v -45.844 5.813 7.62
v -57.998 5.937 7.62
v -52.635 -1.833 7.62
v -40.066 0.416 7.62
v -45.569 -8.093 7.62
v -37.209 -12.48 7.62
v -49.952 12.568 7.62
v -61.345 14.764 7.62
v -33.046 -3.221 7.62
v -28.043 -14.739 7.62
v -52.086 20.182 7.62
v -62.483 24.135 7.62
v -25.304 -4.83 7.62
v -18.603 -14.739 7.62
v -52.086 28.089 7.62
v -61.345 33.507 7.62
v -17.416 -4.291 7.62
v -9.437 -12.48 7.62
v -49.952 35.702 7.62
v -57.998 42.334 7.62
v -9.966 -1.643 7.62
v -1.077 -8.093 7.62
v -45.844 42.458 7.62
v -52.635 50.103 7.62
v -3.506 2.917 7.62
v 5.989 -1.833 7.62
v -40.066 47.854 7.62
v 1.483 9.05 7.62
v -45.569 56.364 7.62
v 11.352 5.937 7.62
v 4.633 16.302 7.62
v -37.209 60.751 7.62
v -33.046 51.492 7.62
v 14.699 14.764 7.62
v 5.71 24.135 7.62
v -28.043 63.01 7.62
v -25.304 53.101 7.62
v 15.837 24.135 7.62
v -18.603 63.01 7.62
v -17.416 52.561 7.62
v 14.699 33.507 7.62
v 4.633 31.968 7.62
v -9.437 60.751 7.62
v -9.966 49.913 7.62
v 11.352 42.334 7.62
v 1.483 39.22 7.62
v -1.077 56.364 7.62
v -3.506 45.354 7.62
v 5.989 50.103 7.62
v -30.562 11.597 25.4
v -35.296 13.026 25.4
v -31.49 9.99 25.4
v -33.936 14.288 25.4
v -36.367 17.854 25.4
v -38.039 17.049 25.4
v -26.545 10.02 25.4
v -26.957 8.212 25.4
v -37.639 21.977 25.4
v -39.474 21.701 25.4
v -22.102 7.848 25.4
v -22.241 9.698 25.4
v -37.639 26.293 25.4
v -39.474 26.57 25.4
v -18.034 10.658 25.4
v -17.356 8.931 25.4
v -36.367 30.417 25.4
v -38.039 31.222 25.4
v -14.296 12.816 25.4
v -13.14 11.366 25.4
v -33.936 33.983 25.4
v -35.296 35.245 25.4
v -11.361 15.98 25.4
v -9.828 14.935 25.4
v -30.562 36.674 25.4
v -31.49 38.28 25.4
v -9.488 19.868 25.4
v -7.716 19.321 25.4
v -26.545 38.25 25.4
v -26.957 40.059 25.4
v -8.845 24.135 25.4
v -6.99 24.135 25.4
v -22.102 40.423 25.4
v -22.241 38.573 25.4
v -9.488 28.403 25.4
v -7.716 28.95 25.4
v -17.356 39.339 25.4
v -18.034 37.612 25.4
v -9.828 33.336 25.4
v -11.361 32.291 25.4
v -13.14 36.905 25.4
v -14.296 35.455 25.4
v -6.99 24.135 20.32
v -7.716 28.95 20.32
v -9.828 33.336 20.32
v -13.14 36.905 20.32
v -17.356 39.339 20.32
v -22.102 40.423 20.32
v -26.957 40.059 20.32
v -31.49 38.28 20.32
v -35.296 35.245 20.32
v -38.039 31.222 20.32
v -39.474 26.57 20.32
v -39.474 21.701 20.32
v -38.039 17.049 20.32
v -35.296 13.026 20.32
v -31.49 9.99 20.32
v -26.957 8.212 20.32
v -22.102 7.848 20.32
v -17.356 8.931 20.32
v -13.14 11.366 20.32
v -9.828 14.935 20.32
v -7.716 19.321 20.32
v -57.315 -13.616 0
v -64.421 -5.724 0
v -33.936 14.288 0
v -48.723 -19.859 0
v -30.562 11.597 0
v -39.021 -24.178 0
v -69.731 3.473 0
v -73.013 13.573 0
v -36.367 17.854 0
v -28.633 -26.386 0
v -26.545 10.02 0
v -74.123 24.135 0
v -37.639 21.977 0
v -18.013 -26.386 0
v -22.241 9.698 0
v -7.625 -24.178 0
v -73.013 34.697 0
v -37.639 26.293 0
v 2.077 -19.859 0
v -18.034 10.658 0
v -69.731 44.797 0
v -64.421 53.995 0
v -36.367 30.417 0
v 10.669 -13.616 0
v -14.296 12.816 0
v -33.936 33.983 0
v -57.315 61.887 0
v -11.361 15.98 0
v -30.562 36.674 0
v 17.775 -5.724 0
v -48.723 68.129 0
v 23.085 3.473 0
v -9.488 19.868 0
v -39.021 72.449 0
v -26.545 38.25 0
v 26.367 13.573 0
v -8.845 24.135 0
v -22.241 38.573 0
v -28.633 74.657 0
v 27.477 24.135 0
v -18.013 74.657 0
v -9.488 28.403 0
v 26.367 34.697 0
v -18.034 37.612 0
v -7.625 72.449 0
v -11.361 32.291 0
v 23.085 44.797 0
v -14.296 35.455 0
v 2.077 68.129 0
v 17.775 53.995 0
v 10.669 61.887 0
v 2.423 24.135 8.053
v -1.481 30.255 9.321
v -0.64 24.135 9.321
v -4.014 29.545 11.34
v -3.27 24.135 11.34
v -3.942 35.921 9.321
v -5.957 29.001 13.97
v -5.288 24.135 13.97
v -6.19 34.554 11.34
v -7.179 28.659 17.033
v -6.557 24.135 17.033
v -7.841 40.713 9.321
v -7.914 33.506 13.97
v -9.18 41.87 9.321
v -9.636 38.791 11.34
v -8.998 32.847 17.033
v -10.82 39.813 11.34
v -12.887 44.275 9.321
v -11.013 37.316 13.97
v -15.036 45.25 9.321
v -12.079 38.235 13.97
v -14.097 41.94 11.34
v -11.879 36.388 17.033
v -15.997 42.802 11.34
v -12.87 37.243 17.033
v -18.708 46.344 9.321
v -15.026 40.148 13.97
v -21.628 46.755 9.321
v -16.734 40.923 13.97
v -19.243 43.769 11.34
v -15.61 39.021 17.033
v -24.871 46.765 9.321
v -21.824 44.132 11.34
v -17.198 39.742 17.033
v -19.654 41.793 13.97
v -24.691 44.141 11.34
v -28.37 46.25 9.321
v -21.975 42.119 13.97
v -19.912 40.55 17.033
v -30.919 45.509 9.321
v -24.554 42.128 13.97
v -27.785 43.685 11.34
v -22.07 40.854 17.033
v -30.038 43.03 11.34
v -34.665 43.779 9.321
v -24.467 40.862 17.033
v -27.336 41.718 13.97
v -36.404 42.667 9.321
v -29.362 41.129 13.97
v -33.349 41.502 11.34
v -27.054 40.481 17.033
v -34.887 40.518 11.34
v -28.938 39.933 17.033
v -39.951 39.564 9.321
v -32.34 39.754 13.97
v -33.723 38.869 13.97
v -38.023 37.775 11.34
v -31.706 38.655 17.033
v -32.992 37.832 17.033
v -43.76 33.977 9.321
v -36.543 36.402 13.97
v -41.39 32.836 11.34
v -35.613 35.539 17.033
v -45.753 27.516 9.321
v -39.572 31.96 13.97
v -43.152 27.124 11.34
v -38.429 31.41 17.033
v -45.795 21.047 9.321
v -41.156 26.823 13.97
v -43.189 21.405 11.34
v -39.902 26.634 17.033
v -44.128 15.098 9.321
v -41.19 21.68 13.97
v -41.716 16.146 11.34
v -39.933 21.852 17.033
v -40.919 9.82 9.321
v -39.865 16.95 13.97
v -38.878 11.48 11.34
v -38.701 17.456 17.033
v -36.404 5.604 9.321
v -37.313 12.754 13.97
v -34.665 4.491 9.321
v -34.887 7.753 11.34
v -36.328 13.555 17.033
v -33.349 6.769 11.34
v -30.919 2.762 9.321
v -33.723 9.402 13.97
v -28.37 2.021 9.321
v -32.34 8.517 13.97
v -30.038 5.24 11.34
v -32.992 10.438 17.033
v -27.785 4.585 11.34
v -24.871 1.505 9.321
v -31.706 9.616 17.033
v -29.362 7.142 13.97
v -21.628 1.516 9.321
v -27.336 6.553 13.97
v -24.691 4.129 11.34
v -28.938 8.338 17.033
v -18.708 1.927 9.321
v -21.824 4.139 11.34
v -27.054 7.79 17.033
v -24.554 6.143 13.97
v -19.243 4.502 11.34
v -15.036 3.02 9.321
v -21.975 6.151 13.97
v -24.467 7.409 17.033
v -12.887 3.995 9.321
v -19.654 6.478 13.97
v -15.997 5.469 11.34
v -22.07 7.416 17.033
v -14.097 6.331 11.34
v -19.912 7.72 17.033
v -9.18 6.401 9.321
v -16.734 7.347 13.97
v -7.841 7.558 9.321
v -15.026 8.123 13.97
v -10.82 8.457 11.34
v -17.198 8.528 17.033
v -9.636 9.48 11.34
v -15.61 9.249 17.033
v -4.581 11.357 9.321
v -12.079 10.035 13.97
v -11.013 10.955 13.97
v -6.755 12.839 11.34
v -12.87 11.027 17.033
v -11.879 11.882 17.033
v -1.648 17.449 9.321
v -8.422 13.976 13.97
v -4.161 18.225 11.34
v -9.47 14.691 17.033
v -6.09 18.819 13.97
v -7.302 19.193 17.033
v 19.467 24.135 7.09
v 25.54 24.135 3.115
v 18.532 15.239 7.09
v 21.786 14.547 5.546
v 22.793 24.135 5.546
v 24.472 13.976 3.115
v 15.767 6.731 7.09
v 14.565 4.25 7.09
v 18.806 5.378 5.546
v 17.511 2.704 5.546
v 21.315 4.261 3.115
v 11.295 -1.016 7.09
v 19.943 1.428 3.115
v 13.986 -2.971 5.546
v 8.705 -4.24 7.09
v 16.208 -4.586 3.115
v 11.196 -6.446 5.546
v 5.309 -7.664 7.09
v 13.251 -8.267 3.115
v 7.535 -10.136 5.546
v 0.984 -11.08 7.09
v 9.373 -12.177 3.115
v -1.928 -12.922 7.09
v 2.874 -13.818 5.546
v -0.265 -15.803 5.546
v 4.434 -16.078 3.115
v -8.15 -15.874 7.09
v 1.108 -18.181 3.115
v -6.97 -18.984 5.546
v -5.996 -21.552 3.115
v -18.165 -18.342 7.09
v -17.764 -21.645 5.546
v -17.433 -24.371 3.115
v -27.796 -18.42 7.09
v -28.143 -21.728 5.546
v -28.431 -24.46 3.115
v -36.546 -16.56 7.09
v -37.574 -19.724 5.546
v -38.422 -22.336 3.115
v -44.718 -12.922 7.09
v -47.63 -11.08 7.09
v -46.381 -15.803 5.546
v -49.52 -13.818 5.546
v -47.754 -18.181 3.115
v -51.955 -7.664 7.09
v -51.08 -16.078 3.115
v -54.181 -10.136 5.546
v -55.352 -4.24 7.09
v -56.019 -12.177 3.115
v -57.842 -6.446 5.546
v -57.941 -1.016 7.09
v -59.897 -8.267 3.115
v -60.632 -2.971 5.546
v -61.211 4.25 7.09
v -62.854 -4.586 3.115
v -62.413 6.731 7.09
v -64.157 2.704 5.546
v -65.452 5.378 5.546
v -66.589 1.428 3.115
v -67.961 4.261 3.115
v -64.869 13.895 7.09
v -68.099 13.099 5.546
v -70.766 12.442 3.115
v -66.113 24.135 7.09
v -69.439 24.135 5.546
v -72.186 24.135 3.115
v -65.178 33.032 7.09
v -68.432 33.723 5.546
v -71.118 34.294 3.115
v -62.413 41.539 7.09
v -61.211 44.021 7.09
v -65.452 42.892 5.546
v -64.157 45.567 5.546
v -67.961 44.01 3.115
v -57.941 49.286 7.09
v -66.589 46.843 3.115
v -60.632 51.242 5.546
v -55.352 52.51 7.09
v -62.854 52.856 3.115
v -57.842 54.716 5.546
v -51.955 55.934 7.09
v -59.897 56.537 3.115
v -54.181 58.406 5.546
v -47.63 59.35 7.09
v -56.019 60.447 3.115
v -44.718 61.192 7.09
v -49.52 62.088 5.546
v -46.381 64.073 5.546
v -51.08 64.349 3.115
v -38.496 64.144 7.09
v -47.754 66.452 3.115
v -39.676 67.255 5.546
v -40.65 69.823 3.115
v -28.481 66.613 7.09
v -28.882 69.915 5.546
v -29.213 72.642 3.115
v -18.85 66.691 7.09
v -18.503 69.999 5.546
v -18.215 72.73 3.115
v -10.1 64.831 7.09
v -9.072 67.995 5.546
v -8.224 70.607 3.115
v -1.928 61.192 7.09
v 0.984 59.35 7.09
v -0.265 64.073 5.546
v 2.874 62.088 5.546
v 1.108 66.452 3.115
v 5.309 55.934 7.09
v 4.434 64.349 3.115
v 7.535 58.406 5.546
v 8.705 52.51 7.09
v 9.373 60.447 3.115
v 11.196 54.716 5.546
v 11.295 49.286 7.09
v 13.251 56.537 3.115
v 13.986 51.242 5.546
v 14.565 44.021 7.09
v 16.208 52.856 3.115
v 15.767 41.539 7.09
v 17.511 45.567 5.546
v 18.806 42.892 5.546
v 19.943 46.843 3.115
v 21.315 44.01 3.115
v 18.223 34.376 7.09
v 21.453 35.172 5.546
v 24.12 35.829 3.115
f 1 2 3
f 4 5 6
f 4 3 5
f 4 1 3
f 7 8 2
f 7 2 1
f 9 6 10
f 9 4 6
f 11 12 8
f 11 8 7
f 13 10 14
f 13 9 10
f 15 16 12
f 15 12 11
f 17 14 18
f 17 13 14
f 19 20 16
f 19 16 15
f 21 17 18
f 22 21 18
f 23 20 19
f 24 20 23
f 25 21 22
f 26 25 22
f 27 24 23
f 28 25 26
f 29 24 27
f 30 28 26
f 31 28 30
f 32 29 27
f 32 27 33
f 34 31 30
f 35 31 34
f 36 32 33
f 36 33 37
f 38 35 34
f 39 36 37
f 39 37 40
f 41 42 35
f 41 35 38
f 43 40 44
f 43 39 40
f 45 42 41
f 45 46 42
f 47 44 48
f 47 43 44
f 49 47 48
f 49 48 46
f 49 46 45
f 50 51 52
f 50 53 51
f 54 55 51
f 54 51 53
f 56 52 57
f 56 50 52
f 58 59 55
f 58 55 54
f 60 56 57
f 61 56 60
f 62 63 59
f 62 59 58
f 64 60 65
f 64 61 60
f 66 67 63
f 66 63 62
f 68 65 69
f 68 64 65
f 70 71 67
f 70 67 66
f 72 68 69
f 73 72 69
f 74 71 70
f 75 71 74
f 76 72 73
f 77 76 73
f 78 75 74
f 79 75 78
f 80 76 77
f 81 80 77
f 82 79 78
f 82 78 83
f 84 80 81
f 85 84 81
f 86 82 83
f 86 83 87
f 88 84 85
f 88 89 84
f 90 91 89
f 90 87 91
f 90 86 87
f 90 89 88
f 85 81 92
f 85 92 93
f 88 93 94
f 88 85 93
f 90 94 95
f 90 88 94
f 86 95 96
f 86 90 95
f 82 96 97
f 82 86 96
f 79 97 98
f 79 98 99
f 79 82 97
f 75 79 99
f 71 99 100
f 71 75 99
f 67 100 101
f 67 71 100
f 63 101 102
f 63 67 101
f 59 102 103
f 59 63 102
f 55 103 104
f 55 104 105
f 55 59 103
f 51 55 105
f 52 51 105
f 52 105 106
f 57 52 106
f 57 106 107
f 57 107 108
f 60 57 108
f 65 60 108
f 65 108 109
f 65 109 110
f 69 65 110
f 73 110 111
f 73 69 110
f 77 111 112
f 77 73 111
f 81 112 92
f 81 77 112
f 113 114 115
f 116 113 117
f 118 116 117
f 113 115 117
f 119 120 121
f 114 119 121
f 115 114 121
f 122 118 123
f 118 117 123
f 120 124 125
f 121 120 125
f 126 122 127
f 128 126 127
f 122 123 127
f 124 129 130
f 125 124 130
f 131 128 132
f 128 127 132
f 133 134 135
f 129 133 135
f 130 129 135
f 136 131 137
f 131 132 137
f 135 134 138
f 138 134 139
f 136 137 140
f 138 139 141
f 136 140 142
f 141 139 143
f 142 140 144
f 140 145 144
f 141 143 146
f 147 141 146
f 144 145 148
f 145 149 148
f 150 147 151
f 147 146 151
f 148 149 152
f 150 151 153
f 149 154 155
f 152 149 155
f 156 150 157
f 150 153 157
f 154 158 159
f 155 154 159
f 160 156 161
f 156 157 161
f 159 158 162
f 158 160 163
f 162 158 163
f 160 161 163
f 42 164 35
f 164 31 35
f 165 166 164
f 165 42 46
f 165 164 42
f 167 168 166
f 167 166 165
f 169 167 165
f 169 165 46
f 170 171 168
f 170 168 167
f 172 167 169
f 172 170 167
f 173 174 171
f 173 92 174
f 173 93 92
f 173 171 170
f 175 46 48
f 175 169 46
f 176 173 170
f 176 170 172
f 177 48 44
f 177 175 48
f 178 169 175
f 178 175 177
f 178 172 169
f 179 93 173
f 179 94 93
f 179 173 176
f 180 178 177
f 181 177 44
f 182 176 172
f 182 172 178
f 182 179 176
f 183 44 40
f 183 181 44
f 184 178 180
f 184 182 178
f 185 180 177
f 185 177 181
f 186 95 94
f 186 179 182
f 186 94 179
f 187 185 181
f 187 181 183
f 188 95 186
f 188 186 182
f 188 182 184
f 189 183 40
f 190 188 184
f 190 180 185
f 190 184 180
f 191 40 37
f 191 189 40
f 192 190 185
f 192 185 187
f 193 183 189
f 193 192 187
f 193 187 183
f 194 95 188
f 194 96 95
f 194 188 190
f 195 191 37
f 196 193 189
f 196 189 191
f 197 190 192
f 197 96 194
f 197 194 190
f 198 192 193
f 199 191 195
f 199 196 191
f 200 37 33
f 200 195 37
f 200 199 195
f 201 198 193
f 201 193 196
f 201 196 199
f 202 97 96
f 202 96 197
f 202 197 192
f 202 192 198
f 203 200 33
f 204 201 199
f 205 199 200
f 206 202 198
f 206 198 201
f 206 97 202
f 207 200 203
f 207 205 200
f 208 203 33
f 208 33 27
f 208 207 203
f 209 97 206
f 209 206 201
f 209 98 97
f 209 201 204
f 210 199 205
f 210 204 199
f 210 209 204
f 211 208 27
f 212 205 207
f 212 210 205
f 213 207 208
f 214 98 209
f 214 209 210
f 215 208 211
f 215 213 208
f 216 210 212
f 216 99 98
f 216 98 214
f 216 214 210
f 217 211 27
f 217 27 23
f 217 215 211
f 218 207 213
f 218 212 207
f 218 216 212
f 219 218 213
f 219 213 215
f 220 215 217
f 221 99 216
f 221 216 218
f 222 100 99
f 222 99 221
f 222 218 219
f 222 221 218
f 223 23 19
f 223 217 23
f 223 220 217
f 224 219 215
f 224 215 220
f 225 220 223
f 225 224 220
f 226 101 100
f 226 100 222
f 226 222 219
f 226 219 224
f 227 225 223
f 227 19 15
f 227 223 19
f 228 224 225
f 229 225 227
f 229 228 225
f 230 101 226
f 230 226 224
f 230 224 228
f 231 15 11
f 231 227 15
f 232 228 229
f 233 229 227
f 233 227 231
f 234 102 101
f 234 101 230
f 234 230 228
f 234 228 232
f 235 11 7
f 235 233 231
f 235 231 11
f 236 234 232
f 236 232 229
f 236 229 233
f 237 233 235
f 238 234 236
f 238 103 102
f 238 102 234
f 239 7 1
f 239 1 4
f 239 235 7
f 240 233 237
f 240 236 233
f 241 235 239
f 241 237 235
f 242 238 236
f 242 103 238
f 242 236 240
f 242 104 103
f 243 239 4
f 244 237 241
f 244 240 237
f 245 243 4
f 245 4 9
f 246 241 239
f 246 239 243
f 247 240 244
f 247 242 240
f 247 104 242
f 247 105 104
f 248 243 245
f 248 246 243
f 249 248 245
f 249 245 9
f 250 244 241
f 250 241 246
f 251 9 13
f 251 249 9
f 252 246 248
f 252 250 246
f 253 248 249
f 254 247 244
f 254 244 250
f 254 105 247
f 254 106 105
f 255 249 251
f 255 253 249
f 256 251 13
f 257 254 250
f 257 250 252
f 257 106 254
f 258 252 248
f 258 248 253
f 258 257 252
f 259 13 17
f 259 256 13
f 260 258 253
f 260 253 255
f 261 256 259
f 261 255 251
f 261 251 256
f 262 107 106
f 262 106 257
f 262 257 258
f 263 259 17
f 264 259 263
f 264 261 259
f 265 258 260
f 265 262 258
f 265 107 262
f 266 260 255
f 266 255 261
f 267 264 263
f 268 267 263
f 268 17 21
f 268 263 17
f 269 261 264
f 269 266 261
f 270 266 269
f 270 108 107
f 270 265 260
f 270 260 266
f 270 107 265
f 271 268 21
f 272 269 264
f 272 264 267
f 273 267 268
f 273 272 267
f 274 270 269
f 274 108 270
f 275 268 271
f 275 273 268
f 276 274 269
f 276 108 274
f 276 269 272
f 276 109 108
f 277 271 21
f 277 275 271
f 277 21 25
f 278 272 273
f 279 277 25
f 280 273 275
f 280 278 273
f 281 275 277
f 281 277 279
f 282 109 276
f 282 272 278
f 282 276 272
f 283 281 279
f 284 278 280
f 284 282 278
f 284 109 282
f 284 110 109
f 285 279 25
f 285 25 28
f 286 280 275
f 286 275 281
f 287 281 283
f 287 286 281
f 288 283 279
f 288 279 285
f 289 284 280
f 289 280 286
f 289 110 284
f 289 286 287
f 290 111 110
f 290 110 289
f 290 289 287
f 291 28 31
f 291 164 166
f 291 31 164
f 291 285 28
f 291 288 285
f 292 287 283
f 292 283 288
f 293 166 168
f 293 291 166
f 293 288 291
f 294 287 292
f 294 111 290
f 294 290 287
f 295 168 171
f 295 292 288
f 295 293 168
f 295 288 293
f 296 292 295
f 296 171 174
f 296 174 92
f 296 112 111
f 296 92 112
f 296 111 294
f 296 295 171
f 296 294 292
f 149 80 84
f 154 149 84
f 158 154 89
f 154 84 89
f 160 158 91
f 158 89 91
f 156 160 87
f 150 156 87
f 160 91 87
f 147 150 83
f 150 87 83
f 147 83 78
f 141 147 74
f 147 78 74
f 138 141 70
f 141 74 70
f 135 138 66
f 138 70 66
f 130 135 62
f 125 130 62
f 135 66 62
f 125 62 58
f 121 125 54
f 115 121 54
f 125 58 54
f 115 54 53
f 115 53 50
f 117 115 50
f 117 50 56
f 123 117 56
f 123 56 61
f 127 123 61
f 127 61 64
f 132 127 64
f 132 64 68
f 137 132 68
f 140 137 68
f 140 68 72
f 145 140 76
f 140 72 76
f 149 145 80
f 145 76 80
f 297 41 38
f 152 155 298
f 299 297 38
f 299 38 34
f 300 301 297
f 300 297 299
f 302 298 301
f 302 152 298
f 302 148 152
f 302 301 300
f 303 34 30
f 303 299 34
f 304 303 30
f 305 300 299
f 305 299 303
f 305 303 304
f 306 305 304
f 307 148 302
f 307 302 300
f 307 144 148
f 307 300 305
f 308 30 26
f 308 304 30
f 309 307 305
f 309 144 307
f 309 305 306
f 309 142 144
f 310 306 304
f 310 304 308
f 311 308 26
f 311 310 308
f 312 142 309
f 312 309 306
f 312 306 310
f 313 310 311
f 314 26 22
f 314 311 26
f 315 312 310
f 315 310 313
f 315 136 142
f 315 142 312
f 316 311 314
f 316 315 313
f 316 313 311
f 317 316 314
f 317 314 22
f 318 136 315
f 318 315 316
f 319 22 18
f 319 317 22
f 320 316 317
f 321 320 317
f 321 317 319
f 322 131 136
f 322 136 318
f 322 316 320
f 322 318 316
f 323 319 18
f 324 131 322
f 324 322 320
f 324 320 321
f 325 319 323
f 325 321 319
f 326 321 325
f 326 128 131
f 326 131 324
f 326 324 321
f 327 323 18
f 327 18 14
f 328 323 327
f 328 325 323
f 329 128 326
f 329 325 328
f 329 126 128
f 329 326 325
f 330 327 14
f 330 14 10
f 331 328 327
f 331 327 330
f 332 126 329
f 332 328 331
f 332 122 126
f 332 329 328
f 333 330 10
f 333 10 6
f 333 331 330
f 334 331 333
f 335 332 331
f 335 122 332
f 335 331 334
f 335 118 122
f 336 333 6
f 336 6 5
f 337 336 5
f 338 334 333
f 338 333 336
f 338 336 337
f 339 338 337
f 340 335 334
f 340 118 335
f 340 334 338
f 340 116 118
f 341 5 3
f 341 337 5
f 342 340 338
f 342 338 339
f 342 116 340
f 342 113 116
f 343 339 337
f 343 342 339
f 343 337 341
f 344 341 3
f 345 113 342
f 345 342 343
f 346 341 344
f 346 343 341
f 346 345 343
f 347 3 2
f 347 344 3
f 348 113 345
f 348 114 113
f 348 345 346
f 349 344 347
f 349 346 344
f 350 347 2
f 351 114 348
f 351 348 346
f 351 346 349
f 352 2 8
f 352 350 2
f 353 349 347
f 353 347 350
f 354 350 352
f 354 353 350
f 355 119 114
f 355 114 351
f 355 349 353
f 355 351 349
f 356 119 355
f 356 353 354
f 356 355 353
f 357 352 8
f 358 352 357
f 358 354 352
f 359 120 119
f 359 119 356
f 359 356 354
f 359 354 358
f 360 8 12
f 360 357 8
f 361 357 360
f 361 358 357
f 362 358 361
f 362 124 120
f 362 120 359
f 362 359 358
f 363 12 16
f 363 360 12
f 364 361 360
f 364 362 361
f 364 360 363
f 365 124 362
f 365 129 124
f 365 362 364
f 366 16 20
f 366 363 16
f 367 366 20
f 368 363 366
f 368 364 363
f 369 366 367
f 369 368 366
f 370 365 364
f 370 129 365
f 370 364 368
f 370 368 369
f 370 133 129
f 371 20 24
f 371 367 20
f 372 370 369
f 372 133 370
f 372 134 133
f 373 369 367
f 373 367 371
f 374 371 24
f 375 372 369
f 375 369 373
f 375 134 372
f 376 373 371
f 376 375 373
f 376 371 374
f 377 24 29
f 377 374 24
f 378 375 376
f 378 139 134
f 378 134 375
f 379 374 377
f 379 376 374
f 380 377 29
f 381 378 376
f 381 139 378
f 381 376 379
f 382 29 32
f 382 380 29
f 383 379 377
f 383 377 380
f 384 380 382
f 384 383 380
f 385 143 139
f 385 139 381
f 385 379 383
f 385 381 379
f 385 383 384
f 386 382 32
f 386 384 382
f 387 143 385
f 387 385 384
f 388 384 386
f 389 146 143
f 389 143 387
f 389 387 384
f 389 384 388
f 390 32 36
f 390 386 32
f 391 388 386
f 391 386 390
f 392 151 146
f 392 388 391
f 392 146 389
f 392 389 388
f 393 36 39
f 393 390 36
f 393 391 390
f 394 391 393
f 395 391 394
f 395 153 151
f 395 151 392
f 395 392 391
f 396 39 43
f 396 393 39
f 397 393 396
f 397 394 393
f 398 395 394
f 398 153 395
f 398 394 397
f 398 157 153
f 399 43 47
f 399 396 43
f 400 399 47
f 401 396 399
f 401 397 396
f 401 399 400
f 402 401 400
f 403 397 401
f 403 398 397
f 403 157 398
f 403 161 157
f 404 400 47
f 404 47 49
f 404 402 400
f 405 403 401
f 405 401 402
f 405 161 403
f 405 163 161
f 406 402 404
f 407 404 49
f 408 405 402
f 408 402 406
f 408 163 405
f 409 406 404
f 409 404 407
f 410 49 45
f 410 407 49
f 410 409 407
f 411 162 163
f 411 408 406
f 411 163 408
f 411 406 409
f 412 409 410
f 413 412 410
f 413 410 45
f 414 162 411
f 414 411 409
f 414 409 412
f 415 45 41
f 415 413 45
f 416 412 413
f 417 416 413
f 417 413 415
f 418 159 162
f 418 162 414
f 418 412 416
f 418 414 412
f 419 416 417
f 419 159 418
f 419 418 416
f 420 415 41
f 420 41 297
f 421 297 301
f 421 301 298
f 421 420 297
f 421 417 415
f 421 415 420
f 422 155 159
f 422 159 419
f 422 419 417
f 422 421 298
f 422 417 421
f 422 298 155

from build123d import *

# Parameters (mm, degrees)
SKETCH1_R           = 50.8
BOSS_EXTRUDE1_DEPTH = 25.4
SKETCH2_R           = 14.478
CUT_EXTRUDE1_DEPTH  = 25.4
SKETCH3_OUTSIDE_W   = 132.782
SKETCH3_OUTSIDE_H   = 132.782
SKETCH3_OUTSIDE_R   = 16.333066569
CUT_EXTRUDE2_DEPTH  = 17.78
FILLET1_R           = 12.7
FILLET2_R           = 12.7


with BuildPart() as part:
    # Sketch1 → Boss-Extrude1 (new body)
    with BuildSketch(Plane.XY):
        with Locations((-23.323029636, 24.13527445)):
            Circle(SKETCH1_R)
    extrude(amount=BOSS_EXTRUDE1_DEPTH)

    # Sketch2 → Cut-Extrude1 (cut)
    with BuildSketch(Plane.XY.offset(25.4)):
        with Locations((-23.323029636, 24.13527445)):
            Circle(SKETCH2_R)
    extrude(amount=-CUT_EXTRUDE1_DEPTH, mode=Mode.SUBTRACT)

    # Sketch3 outside → Cut-Extrude2 (cut)
    with BuildSketch(Plane.XY.offset(25.4)):
        with Locations((-23.323, 24.135)):
            Rectangle(SKETCH3_OUTSIDE_W, SKETCH3_OUTSIDE_H)
        with Locations((-23.323029636, 24.13527445)):
            Circle(SKETCH3_OUTSIDE_R, mode=Mode.SUBTRACT)
    extrude(amount=-CUT_EXTRUDE2_DEPTH, mode=Mode.SUBTRACT)

    # Fillet1
    fillet1_edges = [part.edges().sort_by_distance(p)[0] for p in [
        (-39.656096206, 24.13527445, 7.62),
    ]]
    fillet(fillet1_edges, radius=FILLET1_R)

    # Fillet2
    # the kernel refuses this fillet: 12.7 mm, written as the material it takes off along each edge
    with BuildSketch(Plane(origin=(-23.323029636, 24.13527445, 7.62), x_dir=(1, 0, 0), z_dir=(0, 1, 0))) as fillet2_piece_1:
        with BuildLine():
            CenterArc((39.160257735, 12.7), FILLET2_R, 270, 66.421821522)
            Line((50.8, 7.62), (51.032794845, 7.5184))
            ThreePointArc((51.032794845, 7.5184), (51.054, 3.81), (51.054, 0))
            Line((51.054, 0), (50.8, -0.254))
            Line((50.8, -0.254), (39.160257735, -0.254))
            Line((39.160257735, -0.254), (39.160257735, 0))
        make_face()
    revolve(axis=Axis((-23.323029636, 24.13527445, 7.62), (0, 0, -1)), mode=Mode.SUBTRACT)


solid = part.part
